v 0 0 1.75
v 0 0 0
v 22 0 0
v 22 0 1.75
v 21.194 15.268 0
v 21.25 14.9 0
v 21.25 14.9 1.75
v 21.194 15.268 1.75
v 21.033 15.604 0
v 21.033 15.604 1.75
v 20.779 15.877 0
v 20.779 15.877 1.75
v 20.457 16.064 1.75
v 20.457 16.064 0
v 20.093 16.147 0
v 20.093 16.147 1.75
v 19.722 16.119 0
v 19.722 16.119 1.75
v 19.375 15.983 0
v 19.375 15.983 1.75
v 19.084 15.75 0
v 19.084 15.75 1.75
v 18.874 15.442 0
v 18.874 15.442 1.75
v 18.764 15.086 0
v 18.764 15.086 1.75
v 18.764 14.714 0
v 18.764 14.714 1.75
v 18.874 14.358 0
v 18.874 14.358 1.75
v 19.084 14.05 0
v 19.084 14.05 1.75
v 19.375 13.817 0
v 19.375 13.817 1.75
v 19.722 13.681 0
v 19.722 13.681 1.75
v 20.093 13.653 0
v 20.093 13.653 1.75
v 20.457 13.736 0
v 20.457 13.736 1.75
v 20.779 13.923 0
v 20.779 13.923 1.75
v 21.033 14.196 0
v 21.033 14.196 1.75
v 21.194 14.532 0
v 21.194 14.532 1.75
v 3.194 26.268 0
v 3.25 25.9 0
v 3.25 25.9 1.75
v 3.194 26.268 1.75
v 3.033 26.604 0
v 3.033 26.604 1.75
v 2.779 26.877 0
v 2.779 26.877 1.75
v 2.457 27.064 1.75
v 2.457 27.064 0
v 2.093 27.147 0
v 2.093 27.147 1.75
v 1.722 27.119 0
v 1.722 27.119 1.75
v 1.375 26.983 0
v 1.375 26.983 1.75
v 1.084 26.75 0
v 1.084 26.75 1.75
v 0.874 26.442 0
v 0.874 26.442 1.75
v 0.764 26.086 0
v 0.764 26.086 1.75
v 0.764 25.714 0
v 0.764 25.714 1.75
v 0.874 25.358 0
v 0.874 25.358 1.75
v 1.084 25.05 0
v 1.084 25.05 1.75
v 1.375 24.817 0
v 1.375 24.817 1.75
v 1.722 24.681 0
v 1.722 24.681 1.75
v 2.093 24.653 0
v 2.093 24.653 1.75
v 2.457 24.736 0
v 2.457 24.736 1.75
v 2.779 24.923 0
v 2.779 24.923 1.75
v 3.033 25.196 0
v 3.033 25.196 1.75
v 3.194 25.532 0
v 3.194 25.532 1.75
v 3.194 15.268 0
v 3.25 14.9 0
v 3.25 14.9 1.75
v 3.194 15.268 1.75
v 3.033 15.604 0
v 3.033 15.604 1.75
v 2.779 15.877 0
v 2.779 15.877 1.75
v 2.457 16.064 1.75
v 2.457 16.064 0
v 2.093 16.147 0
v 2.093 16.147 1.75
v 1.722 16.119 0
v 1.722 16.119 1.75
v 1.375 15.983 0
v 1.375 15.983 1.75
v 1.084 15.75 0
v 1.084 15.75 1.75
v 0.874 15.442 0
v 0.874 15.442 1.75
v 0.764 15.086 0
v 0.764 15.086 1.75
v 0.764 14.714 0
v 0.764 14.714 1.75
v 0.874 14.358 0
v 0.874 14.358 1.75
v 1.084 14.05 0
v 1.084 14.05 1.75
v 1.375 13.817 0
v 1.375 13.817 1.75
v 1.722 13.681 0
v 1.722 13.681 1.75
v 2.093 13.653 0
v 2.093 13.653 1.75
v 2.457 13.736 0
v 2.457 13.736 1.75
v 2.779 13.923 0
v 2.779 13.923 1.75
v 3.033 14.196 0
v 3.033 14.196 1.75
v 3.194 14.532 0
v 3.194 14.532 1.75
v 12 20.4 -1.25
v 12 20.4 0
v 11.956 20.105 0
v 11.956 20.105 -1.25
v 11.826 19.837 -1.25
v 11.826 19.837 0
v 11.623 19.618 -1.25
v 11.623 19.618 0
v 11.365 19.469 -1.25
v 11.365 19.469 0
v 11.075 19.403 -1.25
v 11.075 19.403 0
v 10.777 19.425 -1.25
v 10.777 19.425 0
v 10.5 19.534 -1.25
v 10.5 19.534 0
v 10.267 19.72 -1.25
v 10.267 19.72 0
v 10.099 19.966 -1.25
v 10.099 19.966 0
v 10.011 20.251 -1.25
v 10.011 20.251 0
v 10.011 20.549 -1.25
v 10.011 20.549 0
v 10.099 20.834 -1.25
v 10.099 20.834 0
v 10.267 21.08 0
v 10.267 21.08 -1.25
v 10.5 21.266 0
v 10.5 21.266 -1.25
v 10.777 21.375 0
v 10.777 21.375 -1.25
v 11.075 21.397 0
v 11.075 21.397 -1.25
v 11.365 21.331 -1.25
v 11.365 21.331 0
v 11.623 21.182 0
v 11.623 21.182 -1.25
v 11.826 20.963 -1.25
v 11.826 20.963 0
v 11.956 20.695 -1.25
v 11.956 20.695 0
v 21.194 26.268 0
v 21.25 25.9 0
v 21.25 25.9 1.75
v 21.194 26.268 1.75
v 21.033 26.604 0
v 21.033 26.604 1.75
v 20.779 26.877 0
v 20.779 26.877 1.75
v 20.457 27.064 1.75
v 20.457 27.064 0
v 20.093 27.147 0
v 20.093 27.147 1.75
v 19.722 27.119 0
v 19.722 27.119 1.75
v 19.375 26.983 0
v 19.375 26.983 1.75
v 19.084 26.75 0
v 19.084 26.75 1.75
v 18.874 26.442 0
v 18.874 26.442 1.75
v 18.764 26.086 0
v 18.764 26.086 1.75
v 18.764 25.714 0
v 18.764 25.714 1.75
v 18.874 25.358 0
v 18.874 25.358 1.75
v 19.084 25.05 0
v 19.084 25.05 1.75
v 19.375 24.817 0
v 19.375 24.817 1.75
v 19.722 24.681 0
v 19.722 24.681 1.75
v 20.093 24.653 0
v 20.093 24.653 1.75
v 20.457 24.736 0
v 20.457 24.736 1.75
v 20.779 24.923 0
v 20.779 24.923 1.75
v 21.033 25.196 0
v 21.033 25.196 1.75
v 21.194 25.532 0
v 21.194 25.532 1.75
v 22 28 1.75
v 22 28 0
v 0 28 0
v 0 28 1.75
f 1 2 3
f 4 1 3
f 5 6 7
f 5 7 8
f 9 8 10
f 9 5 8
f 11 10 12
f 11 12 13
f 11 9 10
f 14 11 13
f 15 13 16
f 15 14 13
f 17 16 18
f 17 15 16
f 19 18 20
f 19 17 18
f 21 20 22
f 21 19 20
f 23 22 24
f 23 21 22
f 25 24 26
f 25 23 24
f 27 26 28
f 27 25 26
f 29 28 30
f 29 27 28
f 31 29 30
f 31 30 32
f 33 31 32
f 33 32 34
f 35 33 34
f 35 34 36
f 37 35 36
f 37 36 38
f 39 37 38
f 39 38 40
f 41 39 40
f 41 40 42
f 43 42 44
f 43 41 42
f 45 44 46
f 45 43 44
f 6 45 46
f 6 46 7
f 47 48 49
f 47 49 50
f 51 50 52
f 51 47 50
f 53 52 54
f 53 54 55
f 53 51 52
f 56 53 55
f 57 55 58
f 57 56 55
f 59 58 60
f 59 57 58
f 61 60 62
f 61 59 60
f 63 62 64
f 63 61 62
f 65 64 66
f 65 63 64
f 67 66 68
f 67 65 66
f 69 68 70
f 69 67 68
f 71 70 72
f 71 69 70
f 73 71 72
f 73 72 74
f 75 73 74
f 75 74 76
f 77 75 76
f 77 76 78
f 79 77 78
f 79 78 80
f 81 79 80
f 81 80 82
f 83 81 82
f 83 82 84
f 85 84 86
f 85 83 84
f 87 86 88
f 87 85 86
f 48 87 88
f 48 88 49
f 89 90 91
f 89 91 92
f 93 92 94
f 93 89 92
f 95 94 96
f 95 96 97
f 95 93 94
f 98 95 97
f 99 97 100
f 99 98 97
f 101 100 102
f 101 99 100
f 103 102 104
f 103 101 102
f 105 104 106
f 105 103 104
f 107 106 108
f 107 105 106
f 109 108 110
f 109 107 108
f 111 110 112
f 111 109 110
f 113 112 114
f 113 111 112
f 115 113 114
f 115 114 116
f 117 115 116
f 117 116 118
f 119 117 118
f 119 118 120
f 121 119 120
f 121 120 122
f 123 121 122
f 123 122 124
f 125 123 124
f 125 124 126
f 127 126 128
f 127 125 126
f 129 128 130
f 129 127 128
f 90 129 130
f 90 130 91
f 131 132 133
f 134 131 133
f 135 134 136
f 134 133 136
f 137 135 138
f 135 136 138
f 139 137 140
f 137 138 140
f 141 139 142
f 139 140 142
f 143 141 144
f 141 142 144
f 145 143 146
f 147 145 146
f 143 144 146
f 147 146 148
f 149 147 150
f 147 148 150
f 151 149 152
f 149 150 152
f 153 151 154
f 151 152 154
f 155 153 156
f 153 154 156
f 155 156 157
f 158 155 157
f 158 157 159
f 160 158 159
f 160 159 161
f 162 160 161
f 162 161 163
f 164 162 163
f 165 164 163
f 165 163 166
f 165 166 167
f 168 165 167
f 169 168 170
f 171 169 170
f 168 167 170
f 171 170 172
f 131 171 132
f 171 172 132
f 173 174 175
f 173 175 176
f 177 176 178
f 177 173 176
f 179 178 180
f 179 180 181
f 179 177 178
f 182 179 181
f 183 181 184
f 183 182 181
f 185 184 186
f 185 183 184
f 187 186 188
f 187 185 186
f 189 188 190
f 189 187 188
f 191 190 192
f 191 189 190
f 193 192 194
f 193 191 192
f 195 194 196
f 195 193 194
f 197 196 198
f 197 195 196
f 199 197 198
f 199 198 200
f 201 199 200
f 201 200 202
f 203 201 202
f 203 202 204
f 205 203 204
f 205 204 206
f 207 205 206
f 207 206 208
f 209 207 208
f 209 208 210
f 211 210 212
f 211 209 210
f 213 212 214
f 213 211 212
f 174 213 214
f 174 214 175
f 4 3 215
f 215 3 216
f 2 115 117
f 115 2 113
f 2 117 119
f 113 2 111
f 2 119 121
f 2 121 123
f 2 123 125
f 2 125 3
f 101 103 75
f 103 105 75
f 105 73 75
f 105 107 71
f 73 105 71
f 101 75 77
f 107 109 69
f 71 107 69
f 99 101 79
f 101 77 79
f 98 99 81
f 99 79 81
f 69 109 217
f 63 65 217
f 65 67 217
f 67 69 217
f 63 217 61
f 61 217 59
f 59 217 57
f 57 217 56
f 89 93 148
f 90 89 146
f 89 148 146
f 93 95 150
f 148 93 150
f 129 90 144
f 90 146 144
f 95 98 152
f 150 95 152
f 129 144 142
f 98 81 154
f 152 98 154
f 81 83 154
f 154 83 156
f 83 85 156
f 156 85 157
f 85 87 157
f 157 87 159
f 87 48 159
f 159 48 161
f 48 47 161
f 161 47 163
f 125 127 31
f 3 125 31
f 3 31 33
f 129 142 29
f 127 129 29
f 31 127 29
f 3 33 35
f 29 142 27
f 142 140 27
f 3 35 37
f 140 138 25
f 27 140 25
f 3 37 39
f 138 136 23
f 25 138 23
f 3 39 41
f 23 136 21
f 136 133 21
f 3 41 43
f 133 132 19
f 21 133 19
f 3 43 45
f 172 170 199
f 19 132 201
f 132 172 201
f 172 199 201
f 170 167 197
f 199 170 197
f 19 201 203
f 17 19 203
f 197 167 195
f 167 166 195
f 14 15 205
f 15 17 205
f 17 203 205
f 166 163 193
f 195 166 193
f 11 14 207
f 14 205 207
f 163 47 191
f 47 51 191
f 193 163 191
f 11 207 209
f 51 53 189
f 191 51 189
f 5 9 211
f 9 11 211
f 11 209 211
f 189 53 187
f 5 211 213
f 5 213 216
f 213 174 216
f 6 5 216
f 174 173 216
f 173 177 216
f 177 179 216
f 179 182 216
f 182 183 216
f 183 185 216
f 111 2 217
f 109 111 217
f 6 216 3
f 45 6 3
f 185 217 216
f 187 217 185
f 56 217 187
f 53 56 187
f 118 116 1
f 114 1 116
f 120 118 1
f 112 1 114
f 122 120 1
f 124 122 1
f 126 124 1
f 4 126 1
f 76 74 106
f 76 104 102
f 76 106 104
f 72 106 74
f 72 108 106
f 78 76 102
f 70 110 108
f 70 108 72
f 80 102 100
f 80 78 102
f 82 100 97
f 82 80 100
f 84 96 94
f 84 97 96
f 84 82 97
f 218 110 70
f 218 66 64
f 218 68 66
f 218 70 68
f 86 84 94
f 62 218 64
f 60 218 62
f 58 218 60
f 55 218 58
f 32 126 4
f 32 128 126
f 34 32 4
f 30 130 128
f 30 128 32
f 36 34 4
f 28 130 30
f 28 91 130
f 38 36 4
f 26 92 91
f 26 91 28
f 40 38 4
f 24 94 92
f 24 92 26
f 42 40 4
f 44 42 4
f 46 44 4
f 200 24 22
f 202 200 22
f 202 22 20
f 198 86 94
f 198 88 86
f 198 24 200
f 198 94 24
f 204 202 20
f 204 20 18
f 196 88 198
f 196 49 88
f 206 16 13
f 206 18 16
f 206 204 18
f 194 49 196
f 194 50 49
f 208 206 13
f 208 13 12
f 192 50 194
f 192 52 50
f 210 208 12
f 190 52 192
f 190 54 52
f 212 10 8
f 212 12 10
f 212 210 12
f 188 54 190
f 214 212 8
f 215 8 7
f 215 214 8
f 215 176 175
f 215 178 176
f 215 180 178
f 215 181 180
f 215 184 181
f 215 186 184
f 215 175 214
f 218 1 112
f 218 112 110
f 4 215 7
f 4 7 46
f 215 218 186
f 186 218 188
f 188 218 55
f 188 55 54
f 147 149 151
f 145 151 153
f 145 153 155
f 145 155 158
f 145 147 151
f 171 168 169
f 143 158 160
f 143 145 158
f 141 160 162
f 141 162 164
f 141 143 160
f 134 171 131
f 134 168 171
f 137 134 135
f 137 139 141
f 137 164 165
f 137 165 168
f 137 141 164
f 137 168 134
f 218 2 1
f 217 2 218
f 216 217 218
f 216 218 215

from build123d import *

# Parameters (mm, degrees)
SKETCH1_W           = 22
SKETCH1_H           = 28
SKETCH1_R           = 1.25
BOSS_EXTRUDE1_DEPTH = 1.75
SKETCH2_R           = 1
BOSS_EXTRUDE2_DEPTH = 1.25


with BuildPart() as part:
    # Sketch1 → Boss-Extrude1 (new body)
    with BuildSketch(Plane.XY):
        with Locations((11, 14)):
            Rectangle(SKETCH1_W, SKETCH1_H)
        with Locations((2, 25.9)):
            Circle(SKETCH1_R, mode=Mode.SUBTRACT)
        with Locations((2, 14.9)):
            Circle(SKETCH1_R, mode=Mode.SUBTRACT)
        with Locations((20, 14.9)):
            Circle(SKETCH1_R, mode=Mode.SUBTRACT)
        with Locations((20, 25.9)):
            Circle(SKETCH1_R, mode=Mode.SUBTRACT)
    extrude(amount=BOSS_EXTRUDE1_DEPTH)

    # Sketch2 → Boss-Extrude2 (add)
    with BuildSketch(Plane(origin=(0, 0, 0), x_dir=(-1, 0, 0), z_dir=(0, 0, -1))):
        with Locations(Location((-11, 20.4, 0), (0, 0, 180))):
            Circle(SKETCH2_R)
    extrude(amount=BOSS_EXTRUDE2_DEPTH)


solid = part.part
